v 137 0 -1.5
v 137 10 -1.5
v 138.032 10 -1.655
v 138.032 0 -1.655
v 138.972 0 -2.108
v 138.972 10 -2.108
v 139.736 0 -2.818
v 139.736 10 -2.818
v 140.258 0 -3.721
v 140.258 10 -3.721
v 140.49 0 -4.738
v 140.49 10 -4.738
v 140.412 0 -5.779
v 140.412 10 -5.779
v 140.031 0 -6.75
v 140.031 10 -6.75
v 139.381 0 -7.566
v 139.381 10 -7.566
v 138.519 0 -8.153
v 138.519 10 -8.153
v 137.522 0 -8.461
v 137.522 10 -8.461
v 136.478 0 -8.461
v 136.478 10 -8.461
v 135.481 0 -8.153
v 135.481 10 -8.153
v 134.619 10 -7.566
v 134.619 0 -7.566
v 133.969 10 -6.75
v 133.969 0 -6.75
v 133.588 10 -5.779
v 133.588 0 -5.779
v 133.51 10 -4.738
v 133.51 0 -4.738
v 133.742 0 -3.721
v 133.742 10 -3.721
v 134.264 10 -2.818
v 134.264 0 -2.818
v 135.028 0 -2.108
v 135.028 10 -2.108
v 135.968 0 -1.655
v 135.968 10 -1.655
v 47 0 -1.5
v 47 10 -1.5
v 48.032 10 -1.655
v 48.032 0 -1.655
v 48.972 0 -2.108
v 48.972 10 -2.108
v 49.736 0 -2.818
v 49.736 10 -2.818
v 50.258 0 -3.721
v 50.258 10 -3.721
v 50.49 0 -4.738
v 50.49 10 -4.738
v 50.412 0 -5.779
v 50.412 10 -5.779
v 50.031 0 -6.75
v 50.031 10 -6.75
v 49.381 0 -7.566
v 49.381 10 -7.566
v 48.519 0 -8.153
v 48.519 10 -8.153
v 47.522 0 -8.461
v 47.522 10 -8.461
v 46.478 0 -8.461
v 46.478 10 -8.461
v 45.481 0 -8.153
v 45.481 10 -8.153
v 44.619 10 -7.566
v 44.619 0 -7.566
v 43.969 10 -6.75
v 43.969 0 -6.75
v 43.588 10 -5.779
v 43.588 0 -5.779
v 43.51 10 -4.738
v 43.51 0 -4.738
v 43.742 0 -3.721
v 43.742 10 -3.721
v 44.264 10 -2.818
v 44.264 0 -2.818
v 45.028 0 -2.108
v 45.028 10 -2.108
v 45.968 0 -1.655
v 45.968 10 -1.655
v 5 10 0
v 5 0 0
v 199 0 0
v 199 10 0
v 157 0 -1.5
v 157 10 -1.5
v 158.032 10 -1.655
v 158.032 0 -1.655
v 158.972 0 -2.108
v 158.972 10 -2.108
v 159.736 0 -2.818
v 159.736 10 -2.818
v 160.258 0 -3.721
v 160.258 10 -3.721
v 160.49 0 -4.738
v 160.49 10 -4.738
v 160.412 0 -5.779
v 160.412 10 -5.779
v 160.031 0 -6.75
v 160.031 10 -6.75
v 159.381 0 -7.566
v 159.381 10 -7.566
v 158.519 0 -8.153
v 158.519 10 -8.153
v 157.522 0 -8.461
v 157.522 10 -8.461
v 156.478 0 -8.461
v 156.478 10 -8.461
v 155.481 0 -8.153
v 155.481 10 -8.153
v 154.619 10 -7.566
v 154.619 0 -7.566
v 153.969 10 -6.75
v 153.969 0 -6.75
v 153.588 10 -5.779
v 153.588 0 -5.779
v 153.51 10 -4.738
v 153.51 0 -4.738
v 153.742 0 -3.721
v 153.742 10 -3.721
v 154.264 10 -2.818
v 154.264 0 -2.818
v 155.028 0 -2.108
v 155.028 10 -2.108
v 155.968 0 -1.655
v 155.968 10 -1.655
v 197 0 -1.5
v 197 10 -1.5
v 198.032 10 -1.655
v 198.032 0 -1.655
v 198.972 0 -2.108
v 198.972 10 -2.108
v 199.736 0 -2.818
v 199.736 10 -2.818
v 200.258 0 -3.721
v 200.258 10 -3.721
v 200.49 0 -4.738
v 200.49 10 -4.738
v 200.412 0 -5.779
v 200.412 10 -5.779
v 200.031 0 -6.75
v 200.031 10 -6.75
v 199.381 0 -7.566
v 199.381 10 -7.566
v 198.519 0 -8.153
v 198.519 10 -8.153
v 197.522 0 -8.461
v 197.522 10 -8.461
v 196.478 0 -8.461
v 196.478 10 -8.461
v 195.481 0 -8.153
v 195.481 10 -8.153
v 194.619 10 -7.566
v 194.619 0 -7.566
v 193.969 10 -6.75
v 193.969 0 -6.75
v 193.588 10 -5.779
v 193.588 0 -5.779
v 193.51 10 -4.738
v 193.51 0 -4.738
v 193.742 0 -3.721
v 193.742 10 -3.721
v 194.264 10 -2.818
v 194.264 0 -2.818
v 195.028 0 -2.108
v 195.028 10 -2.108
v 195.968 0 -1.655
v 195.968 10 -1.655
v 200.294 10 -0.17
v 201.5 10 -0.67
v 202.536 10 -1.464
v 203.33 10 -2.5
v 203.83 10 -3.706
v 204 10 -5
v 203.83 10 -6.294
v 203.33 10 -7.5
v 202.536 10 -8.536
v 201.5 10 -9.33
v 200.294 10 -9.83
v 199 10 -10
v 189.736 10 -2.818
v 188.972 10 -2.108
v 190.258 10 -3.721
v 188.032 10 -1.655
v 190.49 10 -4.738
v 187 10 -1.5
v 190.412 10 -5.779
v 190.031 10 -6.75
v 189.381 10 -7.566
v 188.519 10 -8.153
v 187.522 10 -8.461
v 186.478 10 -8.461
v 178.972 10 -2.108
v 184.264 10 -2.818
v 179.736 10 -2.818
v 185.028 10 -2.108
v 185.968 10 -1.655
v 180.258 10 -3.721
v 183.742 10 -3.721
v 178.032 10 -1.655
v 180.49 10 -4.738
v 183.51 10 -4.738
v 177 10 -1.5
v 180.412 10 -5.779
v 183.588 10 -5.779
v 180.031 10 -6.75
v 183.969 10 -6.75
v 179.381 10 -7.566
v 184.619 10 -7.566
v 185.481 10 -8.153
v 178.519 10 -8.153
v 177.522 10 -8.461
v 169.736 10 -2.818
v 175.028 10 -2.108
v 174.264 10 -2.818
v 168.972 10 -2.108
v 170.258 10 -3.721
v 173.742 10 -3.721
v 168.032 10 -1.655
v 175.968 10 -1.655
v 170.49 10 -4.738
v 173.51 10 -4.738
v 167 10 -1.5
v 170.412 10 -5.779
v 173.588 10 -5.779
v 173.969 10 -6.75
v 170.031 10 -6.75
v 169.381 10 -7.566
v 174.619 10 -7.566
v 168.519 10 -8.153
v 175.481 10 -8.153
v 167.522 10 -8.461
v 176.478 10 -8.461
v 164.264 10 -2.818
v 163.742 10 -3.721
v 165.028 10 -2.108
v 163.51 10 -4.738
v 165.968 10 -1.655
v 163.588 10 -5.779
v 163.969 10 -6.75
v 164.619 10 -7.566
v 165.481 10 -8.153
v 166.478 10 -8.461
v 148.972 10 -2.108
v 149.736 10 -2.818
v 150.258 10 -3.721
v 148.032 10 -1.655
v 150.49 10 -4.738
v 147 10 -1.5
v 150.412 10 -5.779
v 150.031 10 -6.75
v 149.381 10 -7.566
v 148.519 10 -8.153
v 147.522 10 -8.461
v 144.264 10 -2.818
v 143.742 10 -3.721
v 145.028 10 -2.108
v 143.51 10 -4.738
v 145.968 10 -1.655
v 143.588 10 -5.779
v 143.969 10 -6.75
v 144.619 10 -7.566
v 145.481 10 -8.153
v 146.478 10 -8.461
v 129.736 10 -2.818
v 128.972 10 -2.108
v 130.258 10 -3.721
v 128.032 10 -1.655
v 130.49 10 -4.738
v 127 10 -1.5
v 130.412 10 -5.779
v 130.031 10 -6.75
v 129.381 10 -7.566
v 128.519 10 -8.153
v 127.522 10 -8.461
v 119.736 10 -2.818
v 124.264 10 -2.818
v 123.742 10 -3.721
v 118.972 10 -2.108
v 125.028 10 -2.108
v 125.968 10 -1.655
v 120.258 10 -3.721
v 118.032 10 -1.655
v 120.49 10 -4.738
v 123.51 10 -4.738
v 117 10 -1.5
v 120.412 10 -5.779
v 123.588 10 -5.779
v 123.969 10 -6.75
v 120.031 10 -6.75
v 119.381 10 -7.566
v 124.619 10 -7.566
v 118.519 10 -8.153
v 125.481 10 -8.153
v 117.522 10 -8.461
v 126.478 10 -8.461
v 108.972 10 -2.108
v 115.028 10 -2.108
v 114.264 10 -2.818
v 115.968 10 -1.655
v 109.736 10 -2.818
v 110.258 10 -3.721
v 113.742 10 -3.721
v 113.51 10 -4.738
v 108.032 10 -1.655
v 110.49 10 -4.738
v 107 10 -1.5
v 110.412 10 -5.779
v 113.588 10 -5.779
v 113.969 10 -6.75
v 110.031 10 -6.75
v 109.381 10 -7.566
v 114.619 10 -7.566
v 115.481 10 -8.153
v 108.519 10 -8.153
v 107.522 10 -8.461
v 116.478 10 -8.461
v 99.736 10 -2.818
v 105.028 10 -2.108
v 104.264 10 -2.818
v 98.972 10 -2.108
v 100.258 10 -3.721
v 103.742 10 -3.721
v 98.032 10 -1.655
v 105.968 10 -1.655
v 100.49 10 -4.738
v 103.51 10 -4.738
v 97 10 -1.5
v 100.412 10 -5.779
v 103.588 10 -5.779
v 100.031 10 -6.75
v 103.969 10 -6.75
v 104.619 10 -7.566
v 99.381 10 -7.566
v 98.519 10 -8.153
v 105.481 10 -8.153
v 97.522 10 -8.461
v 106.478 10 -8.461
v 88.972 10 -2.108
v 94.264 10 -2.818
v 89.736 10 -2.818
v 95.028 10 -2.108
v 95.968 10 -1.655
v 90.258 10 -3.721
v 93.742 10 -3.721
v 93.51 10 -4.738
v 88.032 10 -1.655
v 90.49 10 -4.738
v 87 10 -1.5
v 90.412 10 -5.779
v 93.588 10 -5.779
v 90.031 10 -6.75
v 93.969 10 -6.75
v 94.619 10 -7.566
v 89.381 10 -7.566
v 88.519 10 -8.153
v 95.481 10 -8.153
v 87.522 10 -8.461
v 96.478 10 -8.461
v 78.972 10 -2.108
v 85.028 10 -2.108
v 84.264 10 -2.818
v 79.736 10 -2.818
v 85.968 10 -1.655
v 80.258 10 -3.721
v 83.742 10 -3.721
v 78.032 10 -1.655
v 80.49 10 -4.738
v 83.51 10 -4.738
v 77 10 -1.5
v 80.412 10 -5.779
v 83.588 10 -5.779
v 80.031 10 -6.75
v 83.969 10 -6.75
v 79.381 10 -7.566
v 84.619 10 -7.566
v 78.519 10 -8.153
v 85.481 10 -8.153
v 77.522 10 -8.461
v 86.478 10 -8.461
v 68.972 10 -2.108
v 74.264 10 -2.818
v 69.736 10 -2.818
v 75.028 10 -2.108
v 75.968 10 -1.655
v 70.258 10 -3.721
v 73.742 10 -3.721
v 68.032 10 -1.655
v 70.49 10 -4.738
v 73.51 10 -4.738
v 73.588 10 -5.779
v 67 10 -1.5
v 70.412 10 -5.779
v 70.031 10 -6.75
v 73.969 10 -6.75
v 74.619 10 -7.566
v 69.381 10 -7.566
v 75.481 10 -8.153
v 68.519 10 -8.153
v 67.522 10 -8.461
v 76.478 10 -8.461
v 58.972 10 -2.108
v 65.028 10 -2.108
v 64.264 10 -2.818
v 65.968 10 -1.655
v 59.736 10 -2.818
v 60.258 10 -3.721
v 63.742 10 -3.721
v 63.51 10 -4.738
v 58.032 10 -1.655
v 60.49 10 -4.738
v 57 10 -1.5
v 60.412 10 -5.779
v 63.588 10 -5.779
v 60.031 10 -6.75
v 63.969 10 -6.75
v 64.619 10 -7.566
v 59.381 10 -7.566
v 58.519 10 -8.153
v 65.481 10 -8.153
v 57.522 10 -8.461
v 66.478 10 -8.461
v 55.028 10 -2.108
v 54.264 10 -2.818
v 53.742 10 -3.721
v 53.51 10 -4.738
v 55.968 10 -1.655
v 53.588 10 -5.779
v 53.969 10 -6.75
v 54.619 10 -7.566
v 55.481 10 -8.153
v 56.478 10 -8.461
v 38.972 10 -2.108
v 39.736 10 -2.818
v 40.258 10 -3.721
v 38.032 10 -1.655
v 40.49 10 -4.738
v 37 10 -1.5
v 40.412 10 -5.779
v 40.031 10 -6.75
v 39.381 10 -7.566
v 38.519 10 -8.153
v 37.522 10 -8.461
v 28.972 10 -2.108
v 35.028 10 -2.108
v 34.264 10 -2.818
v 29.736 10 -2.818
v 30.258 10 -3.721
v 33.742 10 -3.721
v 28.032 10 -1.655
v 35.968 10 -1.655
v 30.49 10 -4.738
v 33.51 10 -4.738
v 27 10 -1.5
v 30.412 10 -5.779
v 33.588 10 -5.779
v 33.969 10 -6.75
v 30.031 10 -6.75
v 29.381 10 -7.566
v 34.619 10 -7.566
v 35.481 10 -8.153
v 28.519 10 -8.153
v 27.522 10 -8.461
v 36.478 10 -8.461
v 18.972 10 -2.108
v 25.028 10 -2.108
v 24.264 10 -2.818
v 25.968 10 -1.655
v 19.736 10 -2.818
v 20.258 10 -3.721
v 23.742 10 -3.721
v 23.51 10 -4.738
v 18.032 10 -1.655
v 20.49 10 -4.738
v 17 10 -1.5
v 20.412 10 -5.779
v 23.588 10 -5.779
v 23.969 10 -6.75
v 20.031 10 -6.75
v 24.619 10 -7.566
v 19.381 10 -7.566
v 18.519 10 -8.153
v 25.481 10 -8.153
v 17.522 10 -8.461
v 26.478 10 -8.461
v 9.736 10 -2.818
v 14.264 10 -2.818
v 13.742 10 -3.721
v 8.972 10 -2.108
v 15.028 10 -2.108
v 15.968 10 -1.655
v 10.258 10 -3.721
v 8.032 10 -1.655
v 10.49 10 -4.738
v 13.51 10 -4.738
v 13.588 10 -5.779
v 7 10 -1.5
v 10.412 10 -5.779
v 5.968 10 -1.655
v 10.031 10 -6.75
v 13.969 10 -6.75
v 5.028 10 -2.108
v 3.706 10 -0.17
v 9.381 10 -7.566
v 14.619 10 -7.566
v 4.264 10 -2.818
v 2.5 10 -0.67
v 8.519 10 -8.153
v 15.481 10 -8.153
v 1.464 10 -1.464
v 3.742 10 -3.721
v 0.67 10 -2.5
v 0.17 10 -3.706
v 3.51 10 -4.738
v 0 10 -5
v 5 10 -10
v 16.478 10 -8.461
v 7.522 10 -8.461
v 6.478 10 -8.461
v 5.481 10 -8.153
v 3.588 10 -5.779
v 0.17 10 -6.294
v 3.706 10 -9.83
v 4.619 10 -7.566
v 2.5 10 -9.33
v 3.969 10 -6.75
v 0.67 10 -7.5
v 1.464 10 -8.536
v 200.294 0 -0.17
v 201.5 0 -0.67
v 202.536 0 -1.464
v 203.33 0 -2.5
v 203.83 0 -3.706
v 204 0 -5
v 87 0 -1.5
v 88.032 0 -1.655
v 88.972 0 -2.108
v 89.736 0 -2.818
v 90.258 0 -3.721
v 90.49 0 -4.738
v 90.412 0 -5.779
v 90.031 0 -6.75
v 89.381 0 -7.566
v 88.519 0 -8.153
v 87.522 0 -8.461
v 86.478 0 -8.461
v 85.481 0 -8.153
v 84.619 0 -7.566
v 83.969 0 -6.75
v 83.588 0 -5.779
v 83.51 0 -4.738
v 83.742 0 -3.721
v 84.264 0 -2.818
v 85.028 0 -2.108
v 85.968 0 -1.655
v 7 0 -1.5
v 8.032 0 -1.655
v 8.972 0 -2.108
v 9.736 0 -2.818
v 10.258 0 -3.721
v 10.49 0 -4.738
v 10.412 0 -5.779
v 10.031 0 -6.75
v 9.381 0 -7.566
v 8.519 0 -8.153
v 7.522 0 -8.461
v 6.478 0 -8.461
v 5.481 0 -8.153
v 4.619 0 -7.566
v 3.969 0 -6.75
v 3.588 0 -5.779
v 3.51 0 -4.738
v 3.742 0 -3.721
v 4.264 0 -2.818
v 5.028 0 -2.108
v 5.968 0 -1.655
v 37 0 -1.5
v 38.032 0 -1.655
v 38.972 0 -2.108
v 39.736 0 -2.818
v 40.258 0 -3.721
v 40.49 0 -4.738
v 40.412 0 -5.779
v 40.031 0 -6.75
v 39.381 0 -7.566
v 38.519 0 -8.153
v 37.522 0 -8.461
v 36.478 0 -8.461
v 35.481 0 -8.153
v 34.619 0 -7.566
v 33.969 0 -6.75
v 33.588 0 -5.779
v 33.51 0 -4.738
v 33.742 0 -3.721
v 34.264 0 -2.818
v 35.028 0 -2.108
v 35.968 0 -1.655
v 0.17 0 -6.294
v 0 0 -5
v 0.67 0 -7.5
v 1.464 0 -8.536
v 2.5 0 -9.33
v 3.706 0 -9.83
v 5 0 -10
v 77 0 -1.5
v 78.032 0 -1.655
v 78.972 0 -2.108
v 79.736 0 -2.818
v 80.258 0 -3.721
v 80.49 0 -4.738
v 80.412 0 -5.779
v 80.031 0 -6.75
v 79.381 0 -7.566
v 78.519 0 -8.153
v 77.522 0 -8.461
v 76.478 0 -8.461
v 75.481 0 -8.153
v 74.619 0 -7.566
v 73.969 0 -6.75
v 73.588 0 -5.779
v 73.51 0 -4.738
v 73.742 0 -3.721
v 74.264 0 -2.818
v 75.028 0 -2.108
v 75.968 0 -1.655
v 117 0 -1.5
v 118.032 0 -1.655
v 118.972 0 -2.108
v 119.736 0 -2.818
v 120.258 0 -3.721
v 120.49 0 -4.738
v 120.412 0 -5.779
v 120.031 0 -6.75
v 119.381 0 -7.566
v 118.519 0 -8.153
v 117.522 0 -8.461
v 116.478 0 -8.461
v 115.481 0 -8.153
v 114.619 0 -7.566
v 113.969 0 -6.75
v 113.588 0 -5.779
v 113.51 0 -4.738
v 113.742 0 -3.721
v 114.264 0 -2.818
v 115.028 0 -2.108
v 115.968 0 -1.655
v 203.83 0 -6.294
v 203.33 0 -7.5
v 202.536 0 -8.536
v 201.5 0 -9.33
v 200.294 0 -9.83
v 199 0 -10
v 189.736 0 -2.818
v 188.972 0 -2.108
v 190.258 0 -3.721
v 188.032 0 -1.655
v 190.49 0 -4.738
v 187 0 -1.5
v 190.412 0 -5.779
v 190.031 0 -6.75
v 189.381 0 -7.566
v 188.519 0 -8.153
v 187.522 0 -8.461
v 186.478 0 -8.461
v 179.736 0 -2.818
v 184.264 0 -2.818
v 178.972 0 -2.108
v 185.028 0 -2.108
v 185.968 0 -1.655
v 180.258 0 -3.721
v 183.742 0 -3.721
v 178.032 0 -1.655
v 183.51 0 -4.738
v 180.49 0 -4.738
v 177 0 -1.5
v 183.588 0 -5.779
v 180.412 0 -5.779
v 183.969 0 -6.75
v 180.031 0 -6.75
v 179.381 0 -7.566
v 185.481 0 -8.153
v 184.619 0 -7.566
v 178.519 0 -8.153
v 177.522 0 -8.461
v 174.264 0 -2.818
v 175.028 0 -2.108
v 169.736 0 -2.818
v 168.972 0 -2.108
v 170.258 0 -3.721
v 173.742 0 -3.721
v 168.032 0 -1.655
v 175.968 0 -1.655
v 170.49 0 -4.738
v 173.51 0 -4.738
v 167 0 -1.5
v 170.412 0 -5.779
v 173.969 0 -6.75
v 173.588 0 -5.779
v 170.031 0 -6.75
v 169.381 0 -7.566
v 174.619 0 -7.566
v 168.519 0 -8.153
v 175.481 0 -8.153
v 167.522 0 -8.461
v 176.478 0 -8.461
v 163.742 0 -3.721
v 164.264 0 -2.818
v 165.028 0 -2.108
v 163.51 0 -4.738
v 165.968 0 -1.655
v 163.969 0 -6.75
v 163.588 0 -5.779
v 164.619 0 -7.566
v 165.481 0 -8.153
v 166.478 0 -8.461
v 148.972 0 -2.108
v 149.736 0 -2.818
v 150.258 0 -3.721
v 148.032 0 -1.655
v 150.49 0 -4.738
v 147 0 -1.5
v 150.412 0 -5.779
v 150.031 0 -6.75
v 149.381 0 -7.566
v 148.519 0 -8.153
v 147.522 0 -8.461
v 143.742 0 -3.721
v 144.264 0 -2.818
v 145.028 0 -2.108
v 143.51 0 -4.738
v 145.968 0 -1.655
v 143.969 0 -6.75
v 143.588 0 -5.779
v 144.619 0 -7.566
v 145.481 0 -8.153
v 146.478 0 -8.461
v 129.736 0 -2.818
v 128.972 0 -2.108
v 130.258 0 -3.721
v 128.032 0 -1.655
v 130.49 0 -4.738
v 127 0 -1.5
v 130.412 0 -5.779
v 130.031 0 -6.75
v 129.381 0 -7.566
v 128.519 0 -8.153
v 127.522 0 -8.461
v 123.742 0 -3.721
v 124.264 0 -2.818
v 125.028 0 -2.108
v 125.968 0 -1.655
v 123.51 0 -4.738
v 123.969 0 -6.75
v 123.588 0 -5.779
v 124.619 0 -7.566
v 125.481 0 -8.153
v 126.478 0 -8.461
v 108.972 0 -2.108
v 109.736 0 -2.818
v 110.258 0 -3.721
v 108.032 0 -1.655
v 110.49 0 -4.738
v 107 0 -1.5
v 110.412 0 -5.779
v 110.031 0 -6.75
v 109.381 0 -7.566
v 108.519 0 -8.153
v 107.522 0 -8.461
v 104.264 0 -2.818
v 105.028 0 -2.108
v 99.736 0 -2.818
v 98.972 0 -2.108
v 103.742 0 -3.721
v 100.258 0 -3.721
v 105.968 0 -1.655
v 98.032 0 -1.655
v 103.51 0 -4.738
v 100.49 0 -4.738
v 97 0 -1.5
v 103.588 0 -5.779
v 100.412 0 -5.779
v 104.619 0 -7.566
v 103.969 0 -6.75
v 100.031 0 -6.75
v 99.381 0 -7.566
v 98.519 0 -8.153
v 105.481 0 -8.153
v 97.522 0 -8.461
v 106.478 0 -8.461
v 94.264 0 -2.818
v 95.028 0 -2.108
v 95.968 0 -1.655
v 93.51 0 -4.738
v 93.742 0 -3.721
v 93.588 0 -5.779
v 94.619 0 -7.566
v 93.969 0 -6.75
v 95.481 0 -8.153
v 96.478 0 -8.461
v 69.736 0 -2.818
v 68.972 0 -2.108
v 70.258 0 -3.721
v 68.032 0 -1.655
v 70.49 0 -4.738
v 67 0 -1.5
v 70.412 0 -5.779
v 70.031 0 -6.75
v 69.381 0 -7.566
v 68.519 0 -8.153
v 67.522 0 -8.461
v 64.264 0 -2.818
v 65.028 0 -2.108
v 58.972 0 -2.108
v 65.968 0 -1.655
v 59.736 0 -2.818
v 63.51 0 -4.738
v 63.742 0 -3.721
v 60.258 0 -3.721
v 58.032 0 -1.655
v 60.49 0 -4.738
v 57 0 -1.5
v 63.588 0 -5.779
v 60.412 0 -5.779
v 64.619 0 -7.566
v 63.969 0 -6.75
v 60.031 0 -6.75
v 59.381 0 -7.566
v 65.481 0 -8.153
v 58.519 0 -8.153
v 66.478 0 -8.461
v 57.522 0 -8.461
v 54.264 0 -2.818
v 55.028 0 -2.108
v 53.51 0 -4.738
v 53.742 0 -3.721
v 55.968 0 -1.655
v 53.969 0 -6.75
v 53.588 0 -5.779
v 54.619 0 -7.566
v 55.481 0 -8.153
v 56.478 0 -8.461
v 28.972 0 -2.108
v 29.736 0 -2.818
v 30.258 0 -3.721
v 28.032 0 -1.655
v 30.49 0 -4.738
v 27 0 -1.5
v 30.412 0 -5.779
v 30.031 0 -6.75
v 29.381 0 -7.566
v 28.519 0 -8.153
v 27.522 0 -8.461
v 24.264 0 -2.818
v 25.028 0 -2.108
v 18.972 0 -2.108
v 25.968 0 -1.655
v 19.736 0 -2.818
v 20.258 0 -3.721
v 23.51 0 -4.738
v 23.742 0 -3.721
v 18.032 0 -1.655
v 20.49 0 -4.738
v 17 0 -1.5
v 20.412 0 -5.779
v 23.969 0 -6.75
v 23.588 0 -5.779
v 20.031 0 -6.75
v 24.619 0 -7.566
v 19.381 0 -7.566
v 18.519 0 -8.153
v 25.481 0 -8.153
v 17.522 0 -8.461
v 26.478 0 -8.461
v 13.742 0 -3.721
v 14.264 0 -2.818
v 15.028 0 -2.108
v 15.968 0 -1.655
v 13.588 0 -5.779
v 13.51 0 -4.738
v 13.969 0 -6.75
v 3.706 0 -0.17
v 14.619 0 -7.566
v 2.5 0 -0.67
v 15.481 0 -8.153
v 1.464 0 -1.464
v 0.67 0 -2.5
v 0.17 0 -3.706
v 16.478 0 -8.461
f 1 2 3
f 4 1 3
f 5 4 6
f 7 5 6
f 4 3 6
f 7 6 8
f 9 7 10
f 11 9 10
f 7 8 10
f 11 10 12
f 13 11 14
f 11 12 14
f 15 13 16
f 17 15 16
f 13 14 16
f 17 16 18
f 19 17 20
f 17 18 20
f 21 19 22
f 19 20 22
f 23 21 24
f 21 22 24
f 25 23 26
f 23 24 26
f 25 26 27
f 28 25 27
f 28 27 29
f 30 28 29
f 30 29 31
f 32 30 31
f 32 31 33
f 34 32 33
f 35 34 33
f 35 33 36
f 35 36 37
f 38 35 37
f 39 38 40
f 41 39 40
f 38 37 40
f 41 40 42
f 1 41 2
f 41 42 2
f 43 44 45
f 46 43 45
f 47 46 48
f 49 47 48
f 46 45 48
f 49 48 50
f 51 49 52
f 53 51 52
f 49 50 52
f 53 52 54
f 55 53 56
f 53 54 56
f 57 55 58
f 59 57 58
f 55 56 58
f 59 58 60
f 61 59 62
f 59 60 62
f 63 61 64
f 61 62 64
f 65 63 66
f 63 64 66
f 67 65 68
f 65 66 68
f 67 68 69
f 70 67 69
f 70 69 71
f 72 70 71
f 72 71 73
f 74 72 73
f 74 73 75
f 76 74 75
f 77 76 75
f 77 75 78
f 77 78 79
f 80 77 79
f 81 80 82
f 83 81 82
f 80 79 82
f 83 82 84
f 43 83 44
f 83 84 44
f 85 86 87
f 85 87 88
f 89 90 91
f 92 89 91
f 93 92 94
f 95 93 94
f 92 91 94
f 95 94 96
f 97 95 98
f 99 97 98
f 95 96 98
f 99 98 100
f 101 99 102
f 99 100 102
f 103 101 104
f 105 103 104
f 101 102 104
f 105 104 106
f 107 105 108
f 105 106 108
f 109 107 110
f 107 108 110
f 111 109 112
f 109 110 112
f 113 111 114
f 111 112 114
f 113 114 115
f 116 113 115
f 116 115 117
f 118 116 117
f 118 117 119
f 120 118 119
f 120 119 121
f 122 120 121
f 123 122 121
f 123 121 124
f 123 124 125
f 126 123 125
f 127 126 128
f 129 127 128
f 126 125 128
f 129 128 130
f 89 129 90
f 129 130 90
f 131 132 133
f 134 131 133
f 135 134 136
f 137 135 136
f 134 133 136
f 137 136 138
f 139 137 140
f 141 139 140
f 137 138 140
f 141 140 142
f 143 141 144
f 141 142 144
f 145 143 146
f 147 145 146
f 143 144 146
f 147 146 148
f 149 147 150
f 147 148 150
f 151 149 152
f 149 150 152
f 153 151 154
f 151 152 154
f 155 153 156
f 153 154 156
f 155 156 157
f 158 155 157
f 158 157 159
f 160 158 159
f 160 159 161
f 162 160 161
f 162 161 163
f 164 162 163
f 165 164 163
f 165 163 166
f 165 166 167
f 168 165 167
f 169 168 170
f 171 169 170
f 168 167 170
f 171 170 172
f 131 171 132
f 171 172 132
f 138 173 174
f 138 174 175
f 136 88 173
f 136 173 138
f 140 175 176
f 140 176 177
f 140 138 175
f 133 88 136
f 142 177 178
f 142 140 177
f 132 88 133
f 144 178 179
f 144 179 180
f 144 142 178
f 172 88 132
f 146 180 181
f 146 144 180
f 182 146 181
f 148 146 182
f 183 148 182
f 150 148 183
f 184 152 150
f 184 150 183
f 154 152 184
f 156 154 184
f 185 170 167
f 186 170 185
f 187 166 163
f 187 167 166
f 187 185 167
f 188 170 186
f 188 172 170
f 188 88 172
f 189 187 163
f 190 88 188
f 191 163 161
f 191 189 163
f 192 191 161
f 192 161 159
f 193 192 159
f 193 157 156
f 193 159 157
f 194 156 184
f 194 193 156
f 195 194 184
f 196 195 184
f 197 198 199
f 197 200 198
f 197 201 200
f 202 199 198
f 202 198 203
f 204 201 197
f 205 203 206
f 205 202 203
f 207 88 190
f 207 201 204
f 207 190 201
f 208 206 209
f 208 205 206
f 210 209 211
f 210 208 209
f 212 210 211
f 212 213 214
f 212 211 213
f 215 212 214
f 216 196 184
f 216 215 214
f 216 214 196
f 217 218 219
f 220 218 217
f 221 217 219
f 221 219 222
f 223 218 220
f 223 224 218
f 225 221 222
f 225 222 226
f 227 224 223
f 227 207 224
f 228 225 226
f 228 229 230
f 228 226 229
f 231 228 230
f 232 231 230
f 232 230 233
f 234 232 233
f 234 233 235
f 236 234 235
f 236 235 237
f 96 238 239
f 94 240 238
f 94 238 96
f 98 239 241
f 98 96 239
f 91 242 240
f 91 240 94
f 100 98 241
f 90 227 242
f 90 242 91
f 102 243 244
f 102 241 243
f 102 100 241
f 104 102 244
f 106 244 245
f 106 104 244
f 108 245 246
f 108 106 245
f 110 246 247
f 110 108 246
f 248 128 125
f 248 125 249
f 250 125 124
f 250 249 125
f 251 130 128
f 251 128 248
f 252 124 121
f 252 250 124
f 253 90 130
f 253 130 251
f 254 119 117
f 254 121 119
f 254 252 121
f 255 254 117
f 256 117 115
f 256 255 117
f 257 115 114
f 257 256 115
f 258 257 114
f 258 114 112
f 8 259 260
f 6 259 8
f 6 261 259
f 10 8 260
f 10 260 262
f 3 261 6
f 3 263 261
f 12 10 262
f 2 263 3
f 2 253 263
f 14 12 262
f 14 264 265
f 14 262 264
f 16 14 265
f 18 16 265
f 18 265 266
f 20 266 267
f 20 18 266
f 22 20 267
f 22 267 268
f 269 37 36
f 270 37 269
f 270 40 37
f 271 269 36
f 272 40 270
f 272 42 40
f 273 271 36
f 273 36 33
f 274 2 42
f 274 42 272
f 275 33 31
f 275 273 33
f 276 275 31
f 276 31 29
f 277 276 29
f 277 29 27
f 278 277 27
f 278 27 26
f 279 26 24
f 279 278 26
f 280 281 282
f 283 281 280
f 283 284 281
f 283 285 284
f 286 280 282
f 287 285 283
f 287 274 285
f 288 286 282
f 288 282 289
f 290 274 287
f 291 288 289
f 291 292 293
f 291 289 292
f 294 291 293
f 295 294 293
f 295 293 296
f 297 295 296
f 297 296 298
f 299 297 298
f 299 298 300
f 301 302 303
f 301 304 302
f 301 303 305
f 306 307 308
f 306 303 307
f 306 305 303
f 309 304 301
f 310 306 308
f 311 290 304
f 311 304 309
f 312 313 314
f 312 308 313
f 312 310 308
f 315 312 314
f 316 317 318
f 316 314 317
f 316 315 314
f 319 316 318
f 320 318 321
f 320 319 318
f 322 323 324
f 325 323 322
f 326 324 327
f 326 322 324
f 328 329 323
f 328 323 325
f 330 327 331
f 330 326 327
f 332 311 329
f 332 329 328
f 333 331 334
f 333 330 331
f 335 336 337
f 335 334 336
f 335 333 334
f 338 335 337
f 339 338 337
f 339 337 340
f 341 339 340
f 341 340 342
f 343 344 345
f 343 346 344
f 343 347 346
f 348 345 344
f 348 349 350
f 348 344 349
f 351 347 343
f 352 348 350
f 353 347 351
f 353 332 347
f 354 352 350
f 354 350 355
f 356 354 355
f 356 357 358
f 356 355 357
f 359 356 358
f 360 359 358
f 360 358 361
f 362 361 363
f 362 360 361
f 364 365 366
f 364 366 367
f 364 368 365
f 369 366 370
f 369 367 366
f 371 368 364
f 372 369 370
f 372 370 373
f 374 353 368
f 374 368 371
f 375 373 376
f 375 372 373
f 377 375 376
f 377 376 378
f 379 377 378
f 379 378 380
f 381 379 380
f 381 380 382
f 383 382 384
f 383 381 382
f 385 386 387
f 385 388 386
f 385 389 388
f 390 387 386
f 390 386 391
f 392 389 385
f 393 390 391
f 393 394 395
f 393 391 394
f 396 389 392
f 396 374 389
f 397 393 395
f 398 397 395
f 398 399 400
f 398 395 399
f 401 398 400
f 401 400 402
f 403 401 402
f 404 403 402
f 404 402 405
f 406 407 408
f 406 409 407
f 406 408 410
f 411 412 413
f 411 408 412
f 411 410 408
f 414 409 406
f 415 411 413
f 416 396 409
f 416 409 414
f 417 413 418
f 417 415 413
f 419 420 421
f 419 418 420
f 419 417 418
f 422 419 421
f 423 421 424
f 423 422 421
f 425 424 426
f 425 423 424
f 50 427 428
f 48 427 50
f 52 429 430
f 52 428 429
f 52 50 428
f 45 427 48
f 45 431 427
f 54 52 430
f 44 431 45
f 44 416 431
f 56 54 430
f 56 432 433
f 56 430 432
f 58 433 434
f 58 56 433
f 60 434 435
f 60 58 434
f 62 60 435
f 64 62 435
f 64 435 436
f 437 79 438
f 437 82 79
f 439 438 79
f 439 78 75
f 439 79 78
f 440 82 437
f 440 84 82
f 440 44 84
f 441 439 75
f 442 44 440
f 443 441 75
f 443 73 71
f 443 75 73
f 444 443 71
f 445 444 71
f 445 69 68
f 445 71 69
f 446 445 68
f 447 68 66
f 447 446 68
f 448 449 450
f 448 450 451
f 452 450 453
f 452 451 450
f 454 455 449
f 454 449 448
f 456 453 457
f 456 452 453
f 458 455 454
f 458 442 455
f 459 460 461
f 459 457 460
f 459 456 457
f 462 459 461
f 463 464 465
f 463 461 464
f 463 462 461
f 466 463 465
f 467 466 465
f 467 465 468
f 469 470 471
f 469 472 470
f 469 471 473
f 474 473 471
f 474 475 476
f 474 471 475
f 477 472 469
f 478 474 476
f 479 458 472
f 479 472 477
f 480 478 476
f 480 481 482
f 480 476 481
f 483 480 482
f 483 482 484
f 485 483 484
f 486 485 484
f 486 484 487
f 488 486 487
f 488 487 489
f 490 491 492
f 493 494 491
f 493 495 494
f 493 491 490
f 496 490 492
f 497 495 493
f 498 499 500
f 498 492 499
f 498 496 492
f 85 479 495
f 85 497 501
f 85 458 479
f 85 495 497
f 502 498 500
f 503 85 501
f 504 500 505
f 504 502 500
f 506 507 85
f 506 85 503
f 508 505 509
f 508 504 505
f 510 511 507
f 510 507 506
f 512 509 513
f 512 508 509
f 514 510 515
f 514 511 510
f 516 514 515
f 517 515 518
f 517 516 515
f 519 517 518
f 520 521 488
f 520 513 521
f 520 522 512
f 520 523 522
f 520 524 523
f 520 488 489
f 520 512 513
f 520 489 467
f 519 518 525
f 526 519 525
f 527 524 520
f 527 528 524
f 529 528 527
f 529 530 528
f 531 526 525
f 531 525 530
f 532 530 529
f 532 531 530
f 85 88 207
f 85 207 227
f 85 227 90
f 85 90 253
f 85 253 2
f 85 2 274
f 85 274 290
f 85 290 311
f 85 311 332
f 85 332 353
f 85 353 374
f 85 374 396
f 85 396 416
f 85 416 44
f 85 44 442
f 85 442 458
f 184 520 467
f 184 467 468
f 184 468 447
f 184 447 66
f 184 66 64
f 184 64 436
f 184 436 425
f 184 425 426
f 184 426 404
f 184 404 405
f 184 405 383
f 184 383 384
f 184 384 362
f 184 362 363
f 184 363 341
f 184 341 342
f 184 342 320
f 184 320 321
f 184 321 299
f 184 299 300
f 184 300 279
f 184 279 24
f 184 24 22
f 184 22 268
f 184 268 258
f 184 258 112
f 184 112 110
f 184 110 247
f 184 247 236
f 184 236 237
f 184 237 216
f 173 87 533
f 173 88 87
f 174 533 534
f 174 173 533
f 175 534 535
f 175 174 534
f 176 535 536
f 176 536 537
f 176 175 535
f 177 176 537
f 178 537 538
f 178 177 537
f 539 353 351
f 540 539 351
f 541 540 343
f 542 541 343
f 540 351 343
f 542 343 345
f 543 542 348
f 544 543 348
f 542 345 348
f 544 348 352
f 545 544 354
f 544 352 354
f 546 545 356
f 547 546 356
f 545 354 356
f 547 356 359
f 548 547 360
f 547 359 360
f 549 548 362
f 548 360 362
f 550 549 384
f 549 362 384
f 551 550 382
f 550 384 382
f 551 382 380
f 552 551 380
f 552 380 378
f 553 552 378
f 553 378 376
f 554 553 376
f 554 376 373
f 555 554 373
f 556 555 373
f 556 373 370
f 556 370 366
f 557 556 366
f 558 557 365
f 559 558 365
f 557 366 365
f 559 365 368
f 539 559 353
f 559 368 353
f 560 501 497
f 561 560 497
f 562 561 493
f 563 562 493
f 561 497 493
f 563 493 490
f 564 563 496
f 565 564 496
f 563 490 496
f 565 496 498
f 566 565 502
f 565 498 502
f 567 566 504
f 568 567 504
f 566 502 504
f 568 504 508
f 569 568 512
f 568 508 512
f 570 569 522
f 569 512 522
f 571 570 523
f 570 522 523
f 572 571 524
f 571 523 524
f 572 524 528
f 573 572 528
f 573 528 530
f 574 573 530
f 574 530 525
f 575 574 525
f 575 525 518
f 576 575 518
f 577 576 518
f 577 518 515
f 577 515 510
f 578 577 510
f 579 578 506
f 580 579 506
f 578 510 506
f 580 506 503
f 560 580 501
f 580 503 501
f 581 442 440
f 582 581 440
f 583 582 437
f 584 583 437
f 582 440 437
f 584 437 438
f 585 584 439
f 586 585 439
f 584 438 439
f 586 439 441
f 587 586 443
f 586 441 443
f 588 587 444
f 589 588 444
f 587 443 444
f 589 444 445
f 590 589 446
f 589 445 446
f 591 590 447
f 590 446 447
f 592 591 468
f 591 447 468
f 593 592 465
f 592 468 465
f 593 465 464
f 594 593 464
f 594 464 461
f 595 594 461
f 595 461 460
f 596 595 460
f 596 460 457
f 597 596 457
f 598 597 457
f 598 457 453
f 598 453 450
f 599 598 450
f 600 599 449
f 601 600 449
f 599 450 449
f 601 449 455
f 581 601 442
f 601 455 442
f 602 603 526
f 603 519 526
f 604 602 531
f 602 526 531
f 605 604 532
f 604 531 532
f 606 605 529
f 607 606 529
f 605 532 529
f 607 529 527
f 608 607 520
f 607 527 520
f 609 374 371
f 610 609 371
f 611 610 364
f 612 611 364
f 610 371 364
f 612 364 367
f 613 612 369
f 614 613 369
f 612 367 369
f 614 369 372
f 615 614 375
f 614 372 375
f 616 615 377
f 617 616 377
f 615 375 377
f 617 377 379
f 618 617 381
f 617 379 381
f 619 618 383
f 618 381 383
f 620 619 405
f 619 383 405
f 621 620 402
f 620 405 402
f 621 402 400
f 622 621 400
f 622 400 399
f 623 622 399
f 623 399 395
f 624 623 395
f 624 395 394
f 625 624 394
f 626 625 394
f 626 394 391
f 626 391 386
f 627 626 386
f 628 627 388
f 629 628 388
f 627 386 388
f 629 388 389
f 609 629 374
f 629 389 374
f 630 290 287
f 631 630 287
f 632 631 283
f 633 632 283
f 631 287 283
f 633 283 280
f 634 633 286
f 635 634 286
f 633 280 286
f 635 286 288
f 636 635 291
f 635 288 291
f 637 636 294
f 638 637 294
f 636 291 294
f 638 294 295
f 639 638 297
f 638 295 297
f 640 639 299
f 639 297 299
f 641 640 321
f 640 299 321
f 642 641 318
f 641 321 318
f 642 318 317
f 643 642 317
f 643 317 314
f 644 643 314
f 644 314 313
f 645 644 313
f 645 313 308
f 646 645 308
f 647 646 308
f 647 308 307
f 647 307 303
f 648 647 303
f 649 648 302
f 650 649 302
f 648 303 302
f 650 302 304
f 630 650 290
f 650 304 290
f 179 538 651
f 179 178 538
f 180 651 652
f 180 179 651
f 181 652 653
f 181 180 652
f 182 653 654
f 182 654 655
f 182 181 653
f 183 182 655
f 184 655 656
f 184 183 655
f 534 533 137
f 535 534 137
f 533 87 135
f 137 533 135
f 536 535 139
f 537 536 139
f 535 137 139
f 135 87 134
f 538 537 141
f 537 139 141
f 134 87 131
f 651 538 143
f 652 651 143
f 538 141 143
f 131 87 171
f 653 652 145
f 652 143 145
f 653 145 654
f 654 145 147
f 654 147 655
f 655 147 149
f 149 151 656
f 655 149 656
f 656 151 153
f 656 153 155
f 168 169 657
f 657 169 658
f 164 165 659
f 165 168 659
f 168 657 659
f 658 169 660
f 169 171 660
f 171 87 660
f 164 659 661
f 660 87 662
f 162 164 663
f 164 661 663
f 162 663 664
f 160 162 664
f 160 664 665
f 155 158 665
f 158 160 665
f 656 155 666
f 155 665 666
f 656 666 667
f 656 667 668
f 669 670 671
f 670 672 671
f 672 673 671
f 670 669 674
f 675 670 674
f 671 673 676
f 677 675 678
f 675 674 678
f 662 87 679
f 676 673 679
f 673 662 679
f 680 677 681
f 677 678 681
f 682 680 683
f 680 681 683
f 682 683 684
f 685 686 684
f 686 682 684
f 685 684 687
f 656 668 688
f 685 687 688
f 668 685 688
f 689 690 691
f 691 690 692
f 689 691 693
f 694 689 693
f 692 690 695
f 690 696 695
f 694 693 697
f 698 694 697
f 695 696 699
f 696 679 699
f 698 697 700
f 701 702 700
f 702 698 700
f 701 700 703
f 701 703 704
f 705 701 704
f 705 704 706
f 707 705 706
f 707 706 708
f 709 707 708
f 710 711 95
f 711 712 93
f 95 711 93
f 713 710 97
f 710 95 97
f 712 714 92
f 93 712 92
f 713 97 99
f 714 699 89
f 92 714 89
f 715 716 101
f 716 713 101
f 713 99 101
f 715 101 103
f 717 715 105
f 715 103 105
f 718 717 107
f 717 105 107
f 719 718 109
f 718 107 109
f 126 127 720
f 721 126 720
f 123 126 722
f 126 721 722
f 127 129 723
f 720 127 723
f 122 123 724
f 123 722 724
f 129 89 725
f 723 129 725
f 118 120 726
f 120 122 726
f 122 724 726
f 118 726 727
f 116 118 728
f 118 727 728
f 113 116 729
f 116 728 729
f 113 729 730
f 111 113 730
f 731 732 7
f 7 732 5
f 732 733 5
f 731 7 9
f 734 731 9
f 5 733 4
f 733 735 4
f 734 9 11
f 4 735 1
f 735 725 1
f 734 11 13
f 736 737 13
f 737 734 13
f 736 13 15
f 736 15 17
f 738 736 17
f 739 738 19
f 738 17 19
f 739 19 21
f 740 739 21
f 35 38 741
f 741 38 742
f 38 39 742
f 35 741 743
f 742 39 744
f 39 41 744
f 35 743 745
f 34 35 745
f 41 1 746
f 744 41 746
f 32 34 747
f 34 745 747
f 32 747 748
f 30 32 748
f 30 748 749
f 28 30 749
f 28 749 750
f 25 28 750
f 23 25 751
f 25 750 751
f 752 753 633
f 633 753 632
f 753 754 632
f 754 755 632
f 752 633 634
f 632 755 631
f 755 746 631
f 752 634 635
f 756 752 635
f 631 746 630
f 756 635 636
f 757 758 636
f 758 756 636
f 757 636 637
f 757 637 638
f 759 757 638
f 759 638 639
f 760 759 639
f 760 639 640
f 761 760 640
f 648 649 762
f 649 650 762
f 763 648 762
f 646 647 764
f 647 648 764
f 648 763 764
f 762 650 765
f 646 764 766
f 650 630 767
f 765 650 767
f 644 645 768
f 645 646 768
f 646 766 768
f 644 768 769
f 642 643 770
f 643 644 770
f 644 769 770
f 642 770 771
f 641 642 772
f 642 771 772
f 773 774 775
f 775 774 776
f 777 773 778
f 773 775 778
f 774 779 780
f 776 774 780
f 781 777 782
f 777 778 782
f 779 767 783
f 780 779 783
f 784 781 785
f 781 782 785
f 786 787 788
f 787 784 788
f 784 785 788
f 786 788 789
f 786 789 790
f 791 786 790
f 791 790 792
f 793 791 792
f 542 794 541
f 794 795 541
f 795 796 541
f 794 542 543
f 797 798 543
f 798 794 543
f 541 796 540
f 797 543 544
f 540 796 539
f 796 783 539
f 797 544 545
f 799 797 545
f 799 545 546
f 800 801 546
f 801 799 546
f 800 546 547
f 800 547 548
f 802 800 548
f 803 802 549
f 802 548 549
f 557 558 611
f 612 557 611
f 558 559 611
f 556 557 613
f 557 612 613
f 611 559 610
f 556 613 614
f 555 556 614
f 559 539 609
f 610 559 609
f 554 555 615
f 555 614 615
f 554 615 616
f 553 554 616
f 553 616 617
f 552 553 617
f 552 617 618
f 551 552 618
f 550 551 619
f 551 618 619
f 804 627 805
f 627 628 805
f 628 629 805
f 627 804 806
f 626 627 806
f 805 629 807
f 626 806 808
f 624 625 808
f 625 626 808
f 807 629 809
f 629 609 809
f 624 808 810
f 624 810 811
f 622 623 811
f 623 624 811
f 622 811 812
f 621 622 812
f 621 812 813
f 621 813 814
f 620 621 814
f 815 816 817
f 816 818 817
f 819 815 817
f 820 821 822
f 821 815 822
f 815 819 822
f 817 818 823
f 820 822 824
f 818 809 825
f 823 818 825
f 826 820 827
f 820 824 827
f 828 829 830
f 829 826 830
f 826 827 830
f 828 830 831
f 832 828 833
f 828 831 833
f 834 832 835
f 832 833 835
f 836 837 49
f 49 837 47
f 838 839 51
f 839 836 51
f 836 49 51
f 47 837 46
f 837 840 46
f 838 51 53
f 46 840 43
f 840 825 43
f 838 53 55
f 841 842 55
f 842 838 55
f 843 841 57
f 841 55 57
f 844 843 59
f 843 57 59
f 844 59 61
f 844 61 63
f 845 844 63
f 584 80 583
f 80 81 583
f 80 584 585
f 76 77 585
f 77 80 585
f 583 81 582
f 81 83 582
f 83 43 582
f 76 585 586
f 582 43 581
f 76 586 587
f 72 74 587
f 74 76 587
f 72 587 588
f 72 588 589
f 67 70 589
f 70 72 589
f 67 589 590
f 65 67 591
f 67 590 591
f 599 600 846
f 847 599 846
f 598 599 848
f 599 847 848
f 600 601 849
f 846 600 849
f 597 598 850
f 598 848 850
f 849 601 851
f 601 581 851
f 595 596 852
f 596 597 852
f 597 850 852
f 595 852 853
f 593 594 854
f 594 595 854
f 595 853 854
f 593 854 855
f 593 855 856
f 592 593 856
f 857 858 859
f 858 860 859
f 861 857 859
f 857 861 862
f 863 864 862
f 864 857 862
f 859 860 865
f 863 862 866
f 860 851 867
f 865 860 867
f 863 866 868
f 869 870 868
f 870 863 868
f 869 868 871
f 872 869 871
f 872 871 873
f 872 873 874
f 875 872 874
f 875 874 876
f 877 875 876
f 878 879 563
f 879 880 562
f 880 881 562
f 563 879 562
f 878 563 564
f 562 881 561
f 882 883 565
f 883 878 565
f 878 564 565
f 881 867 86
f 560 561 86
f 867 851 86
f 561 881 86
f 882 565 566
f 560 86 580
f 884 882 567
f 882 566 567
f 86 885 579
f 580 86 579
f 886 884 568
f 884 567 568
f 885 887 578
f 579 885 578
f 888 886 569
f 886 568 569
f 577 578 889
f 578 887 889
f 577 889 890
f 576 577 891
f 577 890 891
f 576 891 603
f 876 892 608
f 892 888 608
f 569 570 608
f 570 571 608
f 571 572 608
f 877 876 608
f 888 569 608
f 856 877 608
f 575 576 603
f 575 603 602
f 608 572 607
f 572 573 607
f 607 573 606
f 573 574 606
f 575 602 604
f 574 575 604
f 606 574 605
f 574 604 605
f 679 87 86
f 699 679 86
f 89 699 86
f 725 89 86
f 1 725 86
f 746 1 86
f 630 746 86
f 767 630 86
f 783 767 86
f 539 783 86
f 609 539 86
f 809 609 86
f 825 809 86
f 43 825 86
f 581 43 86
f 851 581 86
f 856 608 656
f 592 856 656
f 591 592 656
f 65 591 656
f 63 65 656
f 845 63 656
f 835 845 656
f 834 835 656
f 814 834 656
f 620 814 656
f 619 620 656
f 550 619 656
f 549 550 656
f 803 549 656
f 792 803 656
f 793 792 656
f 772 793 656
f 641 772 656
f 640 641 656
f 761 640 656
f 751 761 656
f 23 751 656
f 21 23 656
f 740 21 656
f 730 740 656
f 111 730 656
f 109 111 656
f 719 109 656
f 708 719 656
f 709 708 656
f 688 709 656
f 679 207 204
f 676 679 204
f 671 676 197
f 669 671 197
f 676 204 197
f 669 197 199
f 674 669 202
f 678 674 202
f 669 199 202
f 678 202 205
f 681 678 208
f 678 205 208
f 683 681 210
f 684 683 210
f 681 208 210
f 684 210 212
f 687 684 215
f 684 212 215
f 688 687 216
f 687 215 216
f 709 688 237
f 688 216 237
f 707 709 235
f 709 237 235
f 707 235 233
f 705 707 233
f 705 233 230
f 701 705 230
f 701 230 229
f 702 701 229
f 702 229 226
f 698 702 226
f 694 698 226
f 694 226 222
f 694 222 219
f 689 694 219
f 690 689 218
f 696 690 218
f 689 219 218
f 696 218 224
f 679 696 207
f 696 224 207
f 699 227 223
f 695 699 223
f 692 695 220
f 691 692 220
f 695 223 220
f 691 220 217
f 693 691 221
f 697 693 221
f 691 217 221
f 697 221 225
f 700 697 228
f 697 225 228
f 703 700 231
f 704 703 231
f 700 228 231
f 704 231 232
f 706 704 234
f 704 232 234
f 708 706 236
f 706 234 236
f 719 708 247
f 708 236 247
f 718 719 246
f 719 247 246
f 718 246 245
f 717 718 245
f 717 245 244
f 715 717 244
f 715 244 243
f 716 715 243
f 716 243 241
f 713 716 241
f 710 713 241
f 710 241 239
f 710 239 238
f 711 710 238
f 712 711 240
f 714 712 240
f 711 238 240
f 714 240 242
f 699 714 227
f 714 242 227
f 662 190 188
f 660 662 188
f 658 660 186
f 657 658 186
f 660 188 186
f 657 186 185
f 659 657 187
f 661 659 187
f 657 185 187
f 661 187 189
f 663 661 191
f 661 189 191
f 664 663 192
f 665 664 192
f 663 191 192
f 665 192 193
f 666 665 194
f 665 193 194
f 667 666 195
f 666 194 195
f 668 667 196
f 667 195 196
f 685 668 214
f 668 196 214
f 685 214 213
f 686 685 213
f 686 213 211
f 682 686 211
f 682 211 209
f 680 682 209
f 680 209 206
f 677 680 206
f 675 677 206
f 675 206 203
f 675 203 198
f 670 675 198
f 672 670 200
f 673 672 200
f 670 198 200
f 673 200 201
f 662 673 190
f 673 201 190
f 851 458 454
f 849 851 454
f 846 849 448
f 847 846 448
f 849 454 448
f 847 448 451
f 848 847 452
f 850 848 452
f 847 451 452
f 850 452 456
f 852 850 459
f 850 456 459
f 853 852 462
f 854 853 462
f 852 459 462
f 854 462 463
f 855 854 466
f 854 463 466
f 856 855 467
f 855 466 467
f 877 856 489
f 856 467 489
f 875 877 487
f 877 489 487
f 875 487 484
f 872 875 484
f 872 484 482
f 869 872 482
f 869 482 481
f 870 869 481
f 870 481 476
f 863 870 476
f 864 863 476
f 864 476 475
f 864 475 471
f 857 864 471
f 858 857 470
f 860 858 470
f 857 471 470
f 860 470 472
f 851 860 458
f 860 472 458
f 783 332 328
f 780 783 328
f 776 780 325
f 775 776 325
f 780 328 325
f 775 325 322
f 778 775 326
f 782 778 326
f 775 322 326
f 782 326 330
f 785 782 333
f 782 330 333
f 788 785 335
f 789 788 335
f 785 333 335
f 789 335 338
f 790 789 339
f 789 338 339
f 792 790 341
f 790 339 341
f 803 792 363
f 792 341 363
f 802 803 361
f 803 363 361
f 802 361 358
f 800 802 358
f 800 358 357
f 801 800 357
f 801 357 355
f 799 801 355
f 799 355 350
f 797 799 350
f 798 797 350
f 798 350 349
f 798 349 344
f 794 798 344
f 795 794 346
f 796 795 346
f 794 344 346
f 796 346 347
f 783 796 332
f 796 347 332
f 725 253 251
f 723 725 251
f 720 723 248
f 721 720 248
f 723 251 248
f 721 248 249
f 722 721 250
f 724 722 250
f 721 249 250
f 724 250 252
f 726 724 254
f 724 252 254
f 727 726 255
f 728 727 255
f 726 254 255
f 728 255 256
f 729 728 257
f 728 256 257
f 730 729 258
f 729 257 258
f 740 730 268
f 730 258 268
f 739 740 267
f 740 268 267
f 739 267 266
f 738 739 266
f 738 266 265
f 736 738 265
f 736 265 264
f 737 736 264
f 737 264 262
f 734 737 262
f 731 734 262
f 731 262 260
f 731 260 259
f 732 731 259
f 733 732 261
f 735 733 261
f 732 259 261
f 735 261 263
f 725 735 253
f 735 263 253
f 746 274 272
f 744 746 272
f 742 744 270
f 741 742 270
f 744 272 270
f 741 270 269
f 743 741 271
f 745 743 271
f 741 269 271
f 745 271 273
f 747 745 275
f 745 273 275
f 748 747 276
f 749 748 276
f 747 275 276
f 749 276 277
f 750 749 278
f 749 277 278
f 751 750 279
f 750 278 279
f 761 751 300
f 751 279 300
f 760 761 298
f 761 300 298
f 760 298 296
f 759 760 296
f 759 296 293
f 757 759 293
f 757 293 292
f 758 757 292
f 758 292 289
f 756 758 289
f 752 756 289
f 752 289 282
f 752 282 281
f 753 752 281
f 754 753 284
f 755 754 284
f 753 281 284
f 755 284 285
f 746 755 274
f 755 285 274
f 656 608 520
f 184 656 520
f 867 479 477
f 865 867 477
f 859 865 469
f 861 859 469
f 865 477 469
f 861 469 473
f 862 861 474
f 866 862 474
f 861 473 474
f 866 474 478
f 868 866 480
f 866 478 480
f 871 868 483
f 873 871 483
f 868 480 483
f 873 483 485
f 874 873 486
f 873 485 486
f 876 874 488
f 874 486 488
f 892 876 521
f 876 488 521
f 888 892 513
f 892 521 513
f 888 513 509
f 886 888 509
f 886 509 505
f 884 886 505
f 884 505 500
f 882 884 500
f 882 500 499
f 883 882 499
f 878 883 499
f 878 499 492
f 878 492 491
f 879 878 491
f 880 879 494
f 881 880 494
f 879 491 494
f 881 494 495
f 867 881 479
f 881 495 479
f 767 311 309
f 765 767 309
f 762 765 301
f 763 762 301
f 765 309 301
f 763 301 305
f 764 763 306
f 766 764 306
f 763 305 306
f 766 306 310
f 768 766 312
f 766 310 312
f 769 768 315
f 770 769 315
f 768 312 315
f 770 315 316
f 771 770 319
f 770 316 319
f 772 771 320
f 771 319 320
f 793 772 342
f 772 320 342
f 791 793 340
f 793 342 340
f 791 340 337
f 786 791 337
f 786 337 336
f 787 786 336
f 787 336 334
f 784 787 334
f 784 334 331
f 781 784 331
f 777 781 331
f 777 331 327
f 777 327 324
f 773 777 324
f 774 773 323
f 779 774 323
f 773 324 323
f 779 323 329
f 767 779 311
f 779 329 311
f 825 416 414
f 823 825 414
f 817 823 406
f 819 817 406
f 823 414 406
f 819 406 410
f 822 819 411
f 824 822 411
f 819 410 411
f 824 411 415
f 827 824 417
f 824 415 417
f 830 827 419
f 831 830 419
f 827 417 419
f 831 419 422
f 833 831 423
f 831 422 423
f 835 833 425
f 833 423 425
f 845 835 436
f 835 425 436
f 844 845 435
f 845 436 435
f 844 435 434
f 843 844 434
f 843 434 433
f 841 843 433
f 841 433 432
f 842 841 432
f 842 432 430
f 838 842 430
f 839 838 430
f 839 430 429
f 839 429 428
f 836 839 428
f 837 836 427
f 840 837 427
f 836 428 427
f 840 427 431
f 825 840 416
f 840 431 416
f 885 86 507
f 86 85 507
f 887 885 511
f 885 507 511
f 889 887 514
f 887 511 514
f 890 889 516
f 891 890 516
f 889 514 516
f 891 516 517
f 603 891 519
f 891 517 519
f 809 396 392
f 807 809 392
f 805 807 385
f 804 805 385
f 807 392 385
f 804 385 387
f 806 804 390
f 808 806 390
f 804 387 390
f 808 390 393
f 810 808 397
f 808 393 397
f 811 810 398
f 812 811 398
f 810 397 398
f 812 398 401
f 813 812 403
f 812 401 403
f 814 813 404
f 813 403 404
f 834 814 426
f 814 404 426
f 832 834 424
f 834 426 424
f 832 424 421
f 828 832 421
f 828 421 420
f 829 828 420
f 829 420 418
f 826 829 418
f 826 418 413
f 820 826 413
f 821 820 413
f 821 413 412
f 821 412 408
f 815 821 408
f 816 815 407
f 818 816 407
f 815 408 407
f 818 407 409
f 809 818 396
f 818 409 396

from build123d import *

# Parameters (mm, degrees)
SKETCH1_W           = 10
SKETCH1_H           = 10
BOSS_EXTRUDE1_DEPTH = 204
SKETCH2_R           = 3.5
CUT_EXTRUDE1_DEPTH  = 10
LPATTERN1_COUNT     = 20
LPATTERN1_PITCH     = 10
FILLET1_R           = 5


with BuildPart() as part:
    # Sketch1 → Boss-Extrude1 (new body)
    with BuildSketch(Plane(origin=(0, 0, 0), x_dir=(0, 0, -1), z_dir=(1, 0, 0))):
        with Locations((5, 5)):
            Rectangle(SKETCH1_W, SKETCH1_H)
    extrude(amount=BOSS_EXTRUDE1_DEPTH)

    # Sketch2 → Cut-Extrude1 (cut)
    with BuildSketch(Plane(origin=(0, 10, 0), x_dir=(1, 0, 0), z_dir=(0, 1, 0))):
        with Locations(Location((7, 5, 0), (0, 0, 270))):
            Circle(SKETCH2_R)
    cut_extrude1 = extrude(amount=-CUT_EXTRUDE1_DEPTH, mode=Mode.SUBTRACT)

    # LPattern1: Cut-Extrude1 ×20
    with Locations(*[(i * LPATTERN1_PITCH, 0, 0) for i in range(1, LPATTERN1_COUNT)]):
        add(cut_extrude1, mode=Mode.SUBTRACT)

    # Fillet1
    fillet1_edges = [part.edges().sort_by_distance(p)[0] for p in [
        (0, 5, 0),
        (0, 5, -10),
        (204, 5, 0),
        (204, 5, -10),
    ]]
    fillet(fillet1_edges, radius=FILLET1_R - 0.0001)  # a hair under: the kernel refuses the full size


solid = part.part
